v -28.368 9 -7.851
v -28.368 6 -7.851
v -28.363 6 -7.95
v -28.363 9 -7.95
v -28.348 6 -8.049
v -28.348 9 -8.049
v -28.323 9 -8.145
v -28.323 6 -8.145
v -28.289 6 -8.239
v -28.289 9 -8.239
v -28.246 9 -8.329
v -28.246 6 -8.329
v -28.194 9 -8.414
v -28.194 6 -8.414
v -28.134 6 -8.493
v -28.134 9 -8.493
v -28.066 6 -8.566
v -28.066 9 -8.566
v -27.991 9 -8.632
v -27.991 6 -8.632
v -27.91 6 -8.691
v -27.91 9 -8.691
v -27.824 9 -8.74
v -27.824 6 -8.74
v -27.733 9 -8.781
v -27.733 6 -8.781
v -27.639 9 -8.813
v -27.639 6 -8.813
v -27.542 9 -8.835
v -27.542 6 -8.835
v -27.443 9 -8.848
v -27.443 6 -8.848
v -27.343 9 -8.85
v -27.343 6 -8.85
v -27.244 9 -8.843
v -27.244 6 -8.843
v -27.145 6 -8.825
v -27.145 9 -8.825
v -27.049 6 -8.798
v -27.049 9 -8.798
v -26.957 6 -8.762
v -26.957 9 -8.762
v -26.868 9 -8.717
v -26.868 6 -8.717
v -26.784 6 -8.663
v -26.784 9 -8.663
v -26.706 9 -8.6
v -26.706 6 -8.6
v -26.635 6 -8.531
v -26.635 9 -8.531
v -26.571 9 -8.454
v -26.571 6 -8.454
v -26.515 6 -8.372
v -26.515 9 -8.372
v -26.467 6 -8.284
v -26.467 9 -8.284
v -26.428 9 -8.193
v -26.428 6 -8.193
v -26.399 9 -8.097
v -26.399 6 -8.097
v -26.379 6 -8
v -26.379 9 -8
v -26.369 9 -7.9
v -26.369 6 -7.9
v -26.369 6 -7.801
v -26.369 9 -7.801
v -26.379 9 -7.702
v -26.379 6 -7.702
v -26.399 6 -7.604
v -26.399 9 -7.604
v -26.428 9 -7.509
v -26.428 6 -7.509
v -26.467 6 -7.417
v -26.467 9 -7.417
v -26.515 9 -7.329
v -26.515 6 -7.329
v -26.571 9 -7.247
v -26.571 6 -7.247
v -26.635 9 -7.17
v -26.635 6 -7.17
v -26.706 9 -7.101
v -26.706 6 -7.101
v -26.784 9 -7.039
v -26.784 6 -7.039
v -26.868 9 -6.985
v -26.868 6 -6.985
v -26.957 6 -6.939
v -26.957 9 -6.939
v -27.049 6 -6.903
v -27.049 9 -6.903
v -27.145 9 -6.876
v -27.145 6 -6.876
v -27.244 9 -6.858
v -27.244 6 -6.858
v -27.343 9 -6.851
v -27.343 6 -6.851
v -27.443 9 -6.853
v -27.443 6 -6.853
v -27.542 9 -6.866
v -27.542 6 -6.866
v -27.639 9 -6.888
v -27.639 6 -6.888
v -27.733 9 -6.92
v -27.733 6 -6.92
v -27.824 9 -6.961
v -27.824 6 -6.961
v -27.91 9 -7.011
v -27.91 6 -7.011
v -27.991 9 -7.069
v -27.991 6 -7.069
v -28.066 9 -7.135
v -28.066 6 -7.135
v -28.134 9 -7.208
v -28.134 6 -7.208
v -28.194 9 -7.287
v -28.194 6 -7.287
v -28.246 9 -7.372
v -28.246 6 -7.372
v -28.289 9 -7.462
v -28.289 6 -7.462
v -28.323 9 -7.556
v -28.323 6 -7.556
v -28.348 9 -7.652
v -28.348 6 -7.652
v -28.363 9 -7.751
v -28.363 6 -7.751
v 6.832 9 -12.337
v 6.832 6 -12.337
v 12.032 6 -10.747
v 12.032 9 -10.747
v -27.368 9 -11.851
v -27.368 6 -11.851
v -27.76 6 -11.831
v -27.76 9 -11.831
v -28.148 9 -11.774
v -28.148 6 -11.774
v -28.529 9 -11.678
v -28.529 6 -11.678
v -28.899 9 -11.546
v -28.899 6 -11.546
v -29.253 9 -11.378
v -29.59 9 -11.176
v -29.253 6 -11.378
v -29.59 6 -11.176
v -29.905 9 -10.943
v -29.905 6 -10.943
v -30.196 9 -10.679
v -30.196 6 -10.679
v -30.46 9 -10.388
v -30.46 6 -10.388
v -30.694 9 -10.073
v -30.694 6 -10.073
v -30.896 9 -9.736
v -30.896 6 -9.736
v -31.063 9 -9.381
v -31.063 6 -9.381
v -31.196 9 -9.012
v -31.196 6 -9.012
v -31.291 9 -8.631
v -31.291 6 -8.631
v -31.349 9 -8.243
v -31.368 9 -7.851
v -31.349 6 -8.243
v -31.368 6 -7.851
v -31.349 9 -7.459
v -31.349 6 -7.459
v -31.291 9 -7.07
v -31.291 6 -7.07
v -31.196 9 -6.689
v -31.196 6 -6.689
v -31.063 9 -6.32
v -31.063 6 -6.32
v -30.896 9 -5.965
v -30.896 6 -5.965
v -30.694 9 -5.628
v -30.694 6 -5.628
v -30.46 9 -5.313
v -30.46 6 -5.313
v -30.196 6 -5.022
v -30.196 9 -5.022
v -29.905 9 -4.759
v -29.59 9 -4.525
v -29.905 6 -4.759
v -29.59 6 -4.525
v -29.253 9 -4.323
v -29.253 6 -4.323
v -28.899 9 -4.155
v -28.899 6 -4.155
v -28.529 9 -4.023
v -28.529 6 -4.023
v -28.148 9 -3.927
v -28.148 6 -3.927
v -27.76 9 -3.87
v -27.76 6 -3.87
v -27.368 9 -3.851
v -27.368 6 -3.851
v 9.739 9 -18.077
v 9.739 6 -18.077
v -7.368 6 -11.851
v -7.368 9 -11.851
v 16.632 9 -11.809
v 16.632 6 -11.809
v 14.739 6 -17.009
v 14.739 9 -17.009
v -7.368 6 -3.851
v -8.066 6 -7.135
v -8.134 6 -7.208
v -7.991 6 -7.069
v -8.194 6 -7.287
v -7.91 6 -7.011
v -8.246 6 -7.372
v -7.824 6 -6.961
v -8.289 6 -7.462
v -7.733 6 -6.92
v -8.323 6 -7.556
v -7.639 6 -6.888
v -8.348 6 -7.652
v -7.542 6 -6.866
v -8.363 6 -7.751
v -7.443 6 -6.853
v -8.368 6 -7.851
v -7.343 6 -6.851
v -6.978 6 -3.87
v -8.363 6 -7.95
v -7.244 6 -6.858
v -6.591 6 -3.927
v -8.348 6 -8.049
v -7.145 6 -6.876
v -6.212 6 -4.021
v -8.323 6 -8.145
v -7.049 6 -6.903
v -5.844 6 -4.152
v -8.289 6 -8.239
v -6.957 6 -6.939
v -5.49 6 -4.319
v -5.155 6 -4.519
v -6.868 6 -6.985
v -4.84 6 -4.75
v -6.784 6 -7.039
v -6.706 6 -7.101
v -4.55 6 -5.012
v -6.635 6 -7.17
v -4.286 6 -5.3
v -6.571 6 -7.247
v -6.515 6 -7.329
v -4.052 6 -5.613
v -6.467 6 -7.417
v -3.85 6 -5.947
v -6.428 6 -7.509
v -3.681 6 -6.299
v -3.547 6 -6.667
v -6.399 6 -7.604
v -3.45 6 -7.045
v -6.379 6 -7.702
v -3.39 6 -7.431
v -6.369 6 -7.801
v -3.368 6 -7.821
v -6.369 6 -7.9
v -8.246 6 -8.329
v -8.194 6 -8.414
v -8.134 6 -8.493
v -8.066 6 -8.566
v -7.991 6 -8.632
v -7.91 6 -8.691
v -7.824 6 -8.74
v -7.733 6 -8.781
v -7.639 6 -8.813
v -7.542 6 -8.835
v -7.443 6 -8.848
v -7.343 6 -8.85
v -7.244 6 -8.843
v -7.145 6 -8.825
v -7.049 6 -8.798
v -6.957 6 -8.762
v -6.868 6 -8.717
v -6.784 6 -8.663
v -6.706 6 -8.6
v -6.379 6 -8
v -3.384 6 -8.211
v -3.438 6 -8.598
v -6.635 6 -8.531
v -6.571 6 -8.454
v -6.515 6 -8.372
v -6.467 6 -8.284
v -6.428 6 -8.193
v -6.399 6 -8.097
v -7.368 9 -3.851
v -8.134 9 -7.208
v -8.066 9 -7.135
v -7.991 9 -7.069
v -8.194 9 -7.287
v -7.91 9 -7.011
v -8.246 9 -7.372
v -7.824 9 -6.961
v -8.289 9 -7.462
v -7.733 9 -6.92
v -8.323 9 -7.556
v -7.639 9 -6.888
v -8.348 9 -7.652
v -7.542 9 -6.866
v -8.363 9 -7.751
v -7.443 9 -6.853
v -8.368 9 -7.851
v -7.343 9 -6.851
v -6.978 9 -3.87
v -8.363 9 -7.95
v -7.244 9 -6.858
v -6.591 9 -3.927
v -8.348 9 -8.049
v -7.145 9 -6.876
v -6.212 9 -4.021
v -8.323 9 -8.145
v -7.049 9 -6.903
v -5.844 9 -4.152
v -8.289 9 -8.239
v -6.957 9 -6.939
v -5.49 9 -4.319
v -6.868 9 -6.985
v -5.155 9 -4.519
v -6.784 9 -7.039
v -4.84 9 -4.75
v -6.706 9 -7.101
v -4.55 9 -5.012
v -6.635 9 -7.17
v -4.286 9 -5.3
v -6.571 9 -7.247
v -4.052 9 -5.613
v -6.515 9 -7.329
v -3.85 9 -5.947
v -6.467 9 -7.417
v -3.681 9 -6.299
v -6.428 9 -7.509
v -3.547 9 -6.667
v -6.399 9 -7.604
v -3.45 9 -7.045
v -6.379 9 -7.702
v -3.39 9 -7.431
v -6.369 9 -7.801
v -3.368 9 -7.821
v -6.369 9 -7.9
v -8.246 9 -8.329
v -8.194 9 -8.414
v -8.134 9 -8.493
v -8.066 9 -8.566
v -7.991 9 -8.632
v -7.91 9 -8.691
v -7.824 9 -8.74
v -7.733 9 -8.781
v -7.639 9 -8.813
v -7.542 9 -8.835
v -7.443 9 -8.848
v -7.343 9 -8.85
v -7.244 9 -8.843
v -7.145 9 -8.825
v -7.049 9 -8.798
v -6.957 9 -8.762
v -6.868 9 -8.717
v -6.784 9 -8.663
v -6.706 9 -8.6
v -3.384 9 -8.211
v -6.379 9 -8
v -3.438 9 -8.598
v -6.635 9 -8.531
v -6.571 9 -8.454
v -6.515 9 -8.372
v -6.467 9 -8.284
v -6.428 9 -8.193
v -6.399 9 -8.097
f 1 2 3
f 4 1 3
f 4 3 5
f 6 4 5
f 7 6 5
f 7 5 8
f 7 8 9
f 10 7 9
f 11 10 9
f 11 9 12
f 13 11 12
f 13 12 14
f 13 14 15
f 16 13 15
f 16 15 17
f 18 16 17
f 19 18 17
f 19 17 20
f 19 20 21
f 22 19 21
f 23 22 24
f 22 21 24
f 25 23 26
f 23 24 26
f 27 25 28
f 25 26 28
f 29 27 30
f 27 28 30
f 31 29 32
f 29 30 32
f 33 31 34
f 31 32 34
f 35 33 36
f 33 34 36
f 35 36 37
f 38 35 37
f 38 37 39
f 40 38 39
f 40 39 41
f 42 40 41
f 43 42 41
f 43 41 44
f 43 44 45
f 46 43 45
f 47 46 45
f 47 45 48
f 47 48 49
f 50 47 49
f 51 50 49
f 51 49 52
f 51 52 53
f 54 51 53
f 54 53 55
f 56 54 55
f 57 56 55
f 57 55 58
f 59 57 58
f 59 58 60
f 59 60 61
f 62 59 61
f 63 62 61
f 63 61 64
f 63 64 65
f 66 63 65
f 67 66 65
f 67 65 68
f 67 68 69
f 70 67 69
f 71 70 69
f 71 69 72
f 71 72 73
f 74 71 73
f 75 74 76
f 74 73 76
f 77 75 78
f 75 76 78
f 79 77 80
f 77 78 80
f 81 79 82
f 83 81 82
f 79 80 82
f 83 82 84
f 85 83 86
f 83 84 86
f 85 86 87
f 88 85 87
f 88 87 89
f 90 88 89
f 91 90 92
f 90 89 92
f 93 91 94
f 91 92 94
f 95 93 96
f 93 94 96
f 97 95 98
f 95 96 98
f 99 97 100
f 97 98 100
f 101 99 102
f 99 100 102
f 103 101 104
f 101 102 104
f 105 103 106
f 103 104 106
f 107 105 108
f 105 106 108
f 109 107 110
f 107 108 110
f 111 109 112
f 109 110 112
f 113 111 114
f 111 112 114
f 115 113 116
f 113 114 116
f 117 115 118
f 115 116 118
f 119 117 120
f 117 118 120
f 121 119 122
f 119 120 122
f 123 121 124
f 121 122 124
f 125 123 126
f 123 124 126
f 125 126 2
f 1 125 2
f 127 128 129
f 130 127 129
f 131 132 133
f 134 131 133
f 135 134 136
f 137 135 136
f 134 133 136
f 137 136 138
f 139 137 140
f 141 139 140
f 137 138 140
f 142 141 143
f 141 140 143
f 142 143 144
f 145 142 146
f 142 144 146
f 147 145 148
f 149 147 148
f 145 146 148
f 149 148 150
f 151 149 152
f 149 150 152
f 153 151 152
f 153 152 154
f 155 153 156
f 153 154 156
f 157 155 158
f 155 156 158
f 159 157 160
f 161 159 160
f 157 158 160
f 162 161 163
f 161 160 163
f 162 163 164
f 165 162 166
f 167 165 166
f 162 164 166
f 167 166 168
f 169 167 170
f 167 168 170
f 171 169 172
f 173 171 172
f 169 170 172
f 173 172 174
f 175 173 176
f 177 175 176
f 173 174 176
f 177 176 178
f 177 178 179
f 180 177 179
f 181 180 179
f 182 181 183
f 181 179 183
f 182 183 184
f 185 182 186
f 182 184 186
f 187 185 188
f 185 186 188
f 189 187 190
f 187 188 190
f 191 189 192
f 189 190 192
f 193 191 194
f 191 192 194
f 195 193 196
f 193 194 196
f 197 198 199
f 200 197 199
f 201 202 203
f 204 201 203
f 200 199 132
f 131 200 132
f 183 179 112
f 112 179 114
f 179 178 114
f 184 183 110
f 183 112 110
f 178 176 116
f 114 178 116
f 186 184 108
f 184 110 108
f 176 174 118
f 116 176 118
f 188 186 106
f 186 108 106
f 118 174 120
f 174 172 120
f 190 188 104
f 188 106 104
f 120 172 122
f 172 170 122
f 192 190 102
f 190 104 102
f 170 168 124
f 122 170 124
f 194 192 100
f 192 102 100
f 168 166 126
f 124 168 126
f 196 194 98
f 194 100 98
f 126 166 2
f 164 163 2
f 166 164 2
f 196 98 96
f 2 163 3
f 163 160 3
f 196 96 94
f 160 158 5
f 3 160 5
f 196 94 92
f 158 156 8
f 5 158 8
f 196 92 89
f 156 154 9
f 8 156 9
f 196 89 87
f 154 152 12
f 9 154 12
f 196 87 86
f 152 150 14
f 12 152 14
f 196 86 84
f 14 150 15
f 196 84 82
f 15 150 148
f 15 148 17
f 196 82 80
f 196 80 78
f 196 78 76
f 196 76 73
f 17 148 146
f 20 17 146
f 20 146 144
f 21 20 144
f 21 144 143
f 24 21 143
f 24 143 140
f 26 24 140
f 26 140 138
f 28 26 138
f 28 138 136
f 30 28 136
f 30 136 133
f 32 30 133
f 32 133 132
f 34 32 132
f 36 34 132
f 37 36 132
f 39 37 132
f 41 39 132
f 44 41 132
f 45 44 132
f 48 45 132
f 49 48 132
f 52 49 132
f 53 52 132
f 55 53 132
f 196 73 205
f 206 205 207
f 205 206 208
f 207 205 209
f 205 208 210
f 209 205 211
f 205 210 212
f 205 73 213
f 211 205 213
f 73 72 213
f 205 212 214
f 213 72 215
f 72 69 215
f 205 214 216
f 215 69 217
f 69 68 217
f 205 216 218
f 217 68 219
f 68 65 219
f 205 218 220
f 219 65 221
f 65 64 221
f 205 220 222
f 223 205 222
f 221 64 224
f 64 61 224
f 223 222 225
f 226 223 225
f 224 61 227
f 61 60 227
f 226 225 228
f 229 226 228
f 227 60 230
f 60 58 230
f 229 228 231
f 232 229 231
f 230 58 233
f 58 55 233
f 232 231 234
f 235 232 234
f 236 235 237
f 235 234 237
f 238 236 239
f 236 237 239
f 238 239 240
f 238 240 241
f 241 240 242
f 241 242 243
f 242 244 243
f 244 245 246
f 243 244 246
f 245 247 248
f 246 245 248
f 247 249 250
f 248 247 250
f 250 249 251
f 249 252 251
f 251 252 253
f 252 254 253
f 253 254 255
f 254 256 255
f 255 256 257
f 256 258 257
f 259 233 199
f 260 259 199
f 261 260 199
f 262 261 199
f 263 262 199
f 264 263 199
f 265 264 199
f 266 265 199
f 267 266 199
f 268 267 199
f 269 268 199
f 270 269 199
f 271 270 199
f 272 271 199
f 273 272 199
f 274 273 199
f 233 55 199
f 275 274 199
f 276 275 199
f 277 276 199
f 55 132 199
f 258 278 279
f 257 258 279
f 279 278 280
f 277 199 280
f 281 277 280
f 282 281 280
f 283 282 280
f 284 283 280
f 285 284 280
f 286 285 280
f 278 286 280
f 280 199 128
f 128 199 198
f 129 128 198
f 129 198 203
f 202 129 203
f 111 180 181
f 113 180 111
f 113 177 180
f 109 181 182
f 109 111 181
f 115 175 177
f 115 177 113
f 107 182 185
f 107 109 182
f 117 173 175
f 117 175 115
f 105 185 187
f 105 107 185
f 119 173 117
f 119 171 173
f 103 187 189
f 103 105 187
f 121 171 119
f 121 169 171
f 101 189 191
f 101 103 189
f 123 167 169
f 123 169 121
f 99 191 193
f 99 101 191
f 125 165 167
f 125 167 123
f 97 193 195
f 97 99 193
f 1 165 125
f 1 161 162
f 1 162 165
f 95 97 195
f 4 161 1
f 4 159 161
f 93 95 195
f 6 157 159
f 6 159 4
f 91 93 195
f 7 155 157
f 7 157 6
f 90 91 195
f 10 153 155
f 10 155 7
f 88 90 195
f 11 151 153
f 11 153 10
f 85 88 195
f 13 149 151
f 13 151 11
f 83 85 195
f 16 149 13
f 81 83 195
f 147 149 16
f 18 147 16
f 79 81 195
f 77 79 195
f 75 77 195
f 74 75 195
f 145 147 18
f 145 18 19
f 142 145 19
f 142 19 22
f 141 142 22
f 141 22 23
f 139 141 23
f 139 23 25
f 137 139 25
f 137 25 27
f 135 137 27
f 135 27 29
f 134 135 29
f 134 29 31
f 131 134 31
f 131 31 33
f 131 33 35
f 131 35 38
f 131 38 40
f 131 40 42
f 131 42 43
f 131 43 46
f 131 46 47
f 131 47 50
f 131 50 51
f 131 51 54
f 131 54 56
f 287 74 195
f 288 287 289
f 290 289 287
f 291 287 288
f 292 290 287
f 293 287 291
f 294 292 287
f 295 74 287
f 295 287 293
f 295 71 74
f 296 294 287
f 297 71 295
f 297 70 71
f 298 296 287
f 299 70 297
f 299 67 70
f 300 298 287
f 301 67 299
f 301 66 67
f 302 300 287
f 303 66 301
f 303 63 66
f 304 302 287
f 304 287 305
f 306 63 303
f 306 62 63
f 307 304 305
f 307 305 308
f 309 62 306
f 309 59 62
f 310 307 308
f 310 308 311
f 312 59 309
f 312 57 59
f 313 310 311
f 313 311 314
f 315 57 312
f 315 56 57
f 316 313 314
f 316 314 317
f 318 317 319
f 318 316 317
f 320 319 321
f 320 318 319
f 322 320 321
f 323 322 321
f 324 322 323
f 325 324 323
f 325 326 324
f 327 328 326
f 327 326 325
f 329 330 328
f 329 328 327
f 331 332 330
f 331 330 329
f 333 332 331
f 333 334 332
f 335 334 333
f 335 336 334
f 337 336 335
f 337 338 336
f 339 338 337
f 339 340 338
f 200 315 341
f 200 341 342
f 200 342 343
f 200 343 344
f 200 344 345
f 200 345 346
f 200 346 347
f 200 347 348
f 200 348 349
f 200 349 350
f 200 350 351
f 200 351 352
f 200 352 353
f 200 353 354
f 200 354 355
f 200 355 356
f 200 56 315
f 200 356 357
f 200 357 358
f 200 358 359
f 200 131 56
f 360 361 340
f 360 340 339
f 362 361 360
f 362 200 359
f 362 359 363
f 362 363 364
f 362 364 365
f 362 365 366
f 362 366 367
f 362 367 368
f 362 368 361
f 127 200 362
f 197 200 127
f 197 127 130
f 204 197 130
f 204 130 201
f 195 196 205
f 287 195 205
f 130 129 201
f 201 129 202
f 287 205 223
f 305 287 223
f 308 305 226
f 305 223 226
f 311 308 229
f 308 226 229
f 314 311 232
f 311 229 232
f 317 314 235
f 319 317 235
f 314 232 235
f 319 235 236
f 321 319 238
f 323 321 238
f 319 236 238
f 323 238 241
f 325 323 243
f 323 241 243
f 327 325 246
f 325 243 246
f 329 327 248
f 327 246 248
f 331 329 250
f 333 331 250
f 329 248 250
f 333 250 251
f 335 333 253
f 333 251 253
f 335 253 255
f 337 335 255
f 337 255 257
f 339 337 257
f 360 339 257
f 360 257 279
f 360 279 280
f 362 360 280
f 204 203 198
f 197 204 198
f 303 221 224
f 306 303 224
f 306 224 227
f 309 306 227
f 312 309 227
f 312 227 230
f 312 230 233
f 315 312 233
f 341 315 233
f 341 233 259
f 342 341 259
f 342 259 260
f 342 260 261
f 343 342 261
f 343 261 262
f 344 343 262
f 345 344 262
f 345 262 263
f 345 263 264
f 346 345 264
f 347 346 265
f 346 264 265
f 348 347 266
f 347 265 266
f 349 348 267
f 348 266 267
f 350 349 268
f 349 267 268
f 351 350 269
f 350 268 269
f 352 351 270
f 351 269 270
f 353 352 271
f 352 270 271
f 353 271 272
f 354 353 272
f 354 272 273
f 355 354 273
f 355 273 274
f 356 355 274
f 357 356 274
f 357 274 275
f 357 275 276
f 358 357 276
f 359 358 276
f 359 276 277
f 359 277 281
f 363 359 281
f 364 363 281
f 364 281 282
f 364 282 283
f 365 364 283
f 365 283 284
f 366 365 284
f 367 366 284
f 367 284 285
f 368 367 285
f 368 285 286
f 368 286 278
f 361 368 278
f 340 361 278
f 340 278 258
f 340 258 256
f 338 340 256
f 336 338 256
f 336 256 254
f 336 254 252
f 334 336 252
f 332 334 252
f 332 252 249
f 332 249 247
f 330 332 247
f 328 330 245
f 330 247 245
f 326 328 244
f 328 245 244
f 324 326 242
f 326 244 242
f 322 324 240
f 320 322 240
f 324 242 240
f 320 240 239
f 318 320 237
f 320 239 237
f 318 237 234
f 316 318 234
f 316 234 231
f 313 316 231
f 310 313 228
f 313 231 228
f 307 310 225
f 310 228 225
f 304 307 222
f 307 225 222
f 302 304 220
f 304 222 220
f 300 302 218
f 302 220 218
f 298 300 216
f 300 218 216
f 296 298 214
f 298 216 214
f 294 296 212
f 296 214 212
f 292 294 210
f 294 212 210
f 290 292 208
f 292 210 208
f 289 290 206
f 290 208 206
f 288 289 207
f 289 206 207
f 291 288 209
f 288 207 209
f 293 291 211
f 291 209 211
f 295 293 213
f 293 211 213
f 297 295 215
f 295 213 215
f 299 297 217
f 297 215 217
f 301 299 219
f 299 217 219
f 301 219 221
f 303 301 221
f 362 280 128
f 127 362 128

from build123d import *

# Parameters (mm, degrees)
BOSS_EXTRUDE1_DEPTH   = 15
F_1_0MM_DOWEL_HOLE1_D = 10
ESCALA1_SCALE         = 0.2


with BuildPart() as part:
    # Sketch1 → Boss-Extrude1 (new body)
    with BuildSketch(Plane(origin=(0, 0, 0), x_dir=(1, 0, 0), z_dir=(0, 1, 0))):
        with BuildLine():
            Line((0, 20), (-100, 20))
            ThreePointArc((-100, 20), (-120, 0), (-100, -20))
            Line((-100, -20), (0, -20))
            ThreePointArc((0, -20), (20, 0), (0, 20))
        make_face()
        with BuildLine():
            ThreePointArc((0, 20), (12.75180627, 15.407512352), (19.64736126, 3.739143686))
            Line((19.64736126, 3.739143686), (71, 22.429975638))
            Line((71, 22.429975638), (97, 14.480977921))
            Line((97, 14.480977921), (120, 19.790946316))
            Line((120, 19.790946316), (110.536773909, 45.790946316))
            Line((110.536773909, 45.790946316), (85.536773909, 51.132839638))
            Line((85.536773909, 51.132839638), (0, 20))
        make_face()
    extrude(amount=BOSS_EXTRUDE1_DEPTH)

    # Ø1.0mm Dowel Hole1 (through all)
    with Locations(Plane(origin=(0, 15, 0), x_dir=(1, 0, 0), z_dir=(0, 1, 0))):
        with Locations((-100, 0), (0, 0)):
            Hole(F_1_0MM_DOWEL_HOLE1_D / 2)


with BuildPart() as part_1:
    # Escala1: scaled about (-9.209886657, 7.5, -9.81321392)
    add(part.part.scale(ESCALA1_SCALE).moved(Location((-7.367909326, 6, -7.850571136))))


solid = part_1.part
